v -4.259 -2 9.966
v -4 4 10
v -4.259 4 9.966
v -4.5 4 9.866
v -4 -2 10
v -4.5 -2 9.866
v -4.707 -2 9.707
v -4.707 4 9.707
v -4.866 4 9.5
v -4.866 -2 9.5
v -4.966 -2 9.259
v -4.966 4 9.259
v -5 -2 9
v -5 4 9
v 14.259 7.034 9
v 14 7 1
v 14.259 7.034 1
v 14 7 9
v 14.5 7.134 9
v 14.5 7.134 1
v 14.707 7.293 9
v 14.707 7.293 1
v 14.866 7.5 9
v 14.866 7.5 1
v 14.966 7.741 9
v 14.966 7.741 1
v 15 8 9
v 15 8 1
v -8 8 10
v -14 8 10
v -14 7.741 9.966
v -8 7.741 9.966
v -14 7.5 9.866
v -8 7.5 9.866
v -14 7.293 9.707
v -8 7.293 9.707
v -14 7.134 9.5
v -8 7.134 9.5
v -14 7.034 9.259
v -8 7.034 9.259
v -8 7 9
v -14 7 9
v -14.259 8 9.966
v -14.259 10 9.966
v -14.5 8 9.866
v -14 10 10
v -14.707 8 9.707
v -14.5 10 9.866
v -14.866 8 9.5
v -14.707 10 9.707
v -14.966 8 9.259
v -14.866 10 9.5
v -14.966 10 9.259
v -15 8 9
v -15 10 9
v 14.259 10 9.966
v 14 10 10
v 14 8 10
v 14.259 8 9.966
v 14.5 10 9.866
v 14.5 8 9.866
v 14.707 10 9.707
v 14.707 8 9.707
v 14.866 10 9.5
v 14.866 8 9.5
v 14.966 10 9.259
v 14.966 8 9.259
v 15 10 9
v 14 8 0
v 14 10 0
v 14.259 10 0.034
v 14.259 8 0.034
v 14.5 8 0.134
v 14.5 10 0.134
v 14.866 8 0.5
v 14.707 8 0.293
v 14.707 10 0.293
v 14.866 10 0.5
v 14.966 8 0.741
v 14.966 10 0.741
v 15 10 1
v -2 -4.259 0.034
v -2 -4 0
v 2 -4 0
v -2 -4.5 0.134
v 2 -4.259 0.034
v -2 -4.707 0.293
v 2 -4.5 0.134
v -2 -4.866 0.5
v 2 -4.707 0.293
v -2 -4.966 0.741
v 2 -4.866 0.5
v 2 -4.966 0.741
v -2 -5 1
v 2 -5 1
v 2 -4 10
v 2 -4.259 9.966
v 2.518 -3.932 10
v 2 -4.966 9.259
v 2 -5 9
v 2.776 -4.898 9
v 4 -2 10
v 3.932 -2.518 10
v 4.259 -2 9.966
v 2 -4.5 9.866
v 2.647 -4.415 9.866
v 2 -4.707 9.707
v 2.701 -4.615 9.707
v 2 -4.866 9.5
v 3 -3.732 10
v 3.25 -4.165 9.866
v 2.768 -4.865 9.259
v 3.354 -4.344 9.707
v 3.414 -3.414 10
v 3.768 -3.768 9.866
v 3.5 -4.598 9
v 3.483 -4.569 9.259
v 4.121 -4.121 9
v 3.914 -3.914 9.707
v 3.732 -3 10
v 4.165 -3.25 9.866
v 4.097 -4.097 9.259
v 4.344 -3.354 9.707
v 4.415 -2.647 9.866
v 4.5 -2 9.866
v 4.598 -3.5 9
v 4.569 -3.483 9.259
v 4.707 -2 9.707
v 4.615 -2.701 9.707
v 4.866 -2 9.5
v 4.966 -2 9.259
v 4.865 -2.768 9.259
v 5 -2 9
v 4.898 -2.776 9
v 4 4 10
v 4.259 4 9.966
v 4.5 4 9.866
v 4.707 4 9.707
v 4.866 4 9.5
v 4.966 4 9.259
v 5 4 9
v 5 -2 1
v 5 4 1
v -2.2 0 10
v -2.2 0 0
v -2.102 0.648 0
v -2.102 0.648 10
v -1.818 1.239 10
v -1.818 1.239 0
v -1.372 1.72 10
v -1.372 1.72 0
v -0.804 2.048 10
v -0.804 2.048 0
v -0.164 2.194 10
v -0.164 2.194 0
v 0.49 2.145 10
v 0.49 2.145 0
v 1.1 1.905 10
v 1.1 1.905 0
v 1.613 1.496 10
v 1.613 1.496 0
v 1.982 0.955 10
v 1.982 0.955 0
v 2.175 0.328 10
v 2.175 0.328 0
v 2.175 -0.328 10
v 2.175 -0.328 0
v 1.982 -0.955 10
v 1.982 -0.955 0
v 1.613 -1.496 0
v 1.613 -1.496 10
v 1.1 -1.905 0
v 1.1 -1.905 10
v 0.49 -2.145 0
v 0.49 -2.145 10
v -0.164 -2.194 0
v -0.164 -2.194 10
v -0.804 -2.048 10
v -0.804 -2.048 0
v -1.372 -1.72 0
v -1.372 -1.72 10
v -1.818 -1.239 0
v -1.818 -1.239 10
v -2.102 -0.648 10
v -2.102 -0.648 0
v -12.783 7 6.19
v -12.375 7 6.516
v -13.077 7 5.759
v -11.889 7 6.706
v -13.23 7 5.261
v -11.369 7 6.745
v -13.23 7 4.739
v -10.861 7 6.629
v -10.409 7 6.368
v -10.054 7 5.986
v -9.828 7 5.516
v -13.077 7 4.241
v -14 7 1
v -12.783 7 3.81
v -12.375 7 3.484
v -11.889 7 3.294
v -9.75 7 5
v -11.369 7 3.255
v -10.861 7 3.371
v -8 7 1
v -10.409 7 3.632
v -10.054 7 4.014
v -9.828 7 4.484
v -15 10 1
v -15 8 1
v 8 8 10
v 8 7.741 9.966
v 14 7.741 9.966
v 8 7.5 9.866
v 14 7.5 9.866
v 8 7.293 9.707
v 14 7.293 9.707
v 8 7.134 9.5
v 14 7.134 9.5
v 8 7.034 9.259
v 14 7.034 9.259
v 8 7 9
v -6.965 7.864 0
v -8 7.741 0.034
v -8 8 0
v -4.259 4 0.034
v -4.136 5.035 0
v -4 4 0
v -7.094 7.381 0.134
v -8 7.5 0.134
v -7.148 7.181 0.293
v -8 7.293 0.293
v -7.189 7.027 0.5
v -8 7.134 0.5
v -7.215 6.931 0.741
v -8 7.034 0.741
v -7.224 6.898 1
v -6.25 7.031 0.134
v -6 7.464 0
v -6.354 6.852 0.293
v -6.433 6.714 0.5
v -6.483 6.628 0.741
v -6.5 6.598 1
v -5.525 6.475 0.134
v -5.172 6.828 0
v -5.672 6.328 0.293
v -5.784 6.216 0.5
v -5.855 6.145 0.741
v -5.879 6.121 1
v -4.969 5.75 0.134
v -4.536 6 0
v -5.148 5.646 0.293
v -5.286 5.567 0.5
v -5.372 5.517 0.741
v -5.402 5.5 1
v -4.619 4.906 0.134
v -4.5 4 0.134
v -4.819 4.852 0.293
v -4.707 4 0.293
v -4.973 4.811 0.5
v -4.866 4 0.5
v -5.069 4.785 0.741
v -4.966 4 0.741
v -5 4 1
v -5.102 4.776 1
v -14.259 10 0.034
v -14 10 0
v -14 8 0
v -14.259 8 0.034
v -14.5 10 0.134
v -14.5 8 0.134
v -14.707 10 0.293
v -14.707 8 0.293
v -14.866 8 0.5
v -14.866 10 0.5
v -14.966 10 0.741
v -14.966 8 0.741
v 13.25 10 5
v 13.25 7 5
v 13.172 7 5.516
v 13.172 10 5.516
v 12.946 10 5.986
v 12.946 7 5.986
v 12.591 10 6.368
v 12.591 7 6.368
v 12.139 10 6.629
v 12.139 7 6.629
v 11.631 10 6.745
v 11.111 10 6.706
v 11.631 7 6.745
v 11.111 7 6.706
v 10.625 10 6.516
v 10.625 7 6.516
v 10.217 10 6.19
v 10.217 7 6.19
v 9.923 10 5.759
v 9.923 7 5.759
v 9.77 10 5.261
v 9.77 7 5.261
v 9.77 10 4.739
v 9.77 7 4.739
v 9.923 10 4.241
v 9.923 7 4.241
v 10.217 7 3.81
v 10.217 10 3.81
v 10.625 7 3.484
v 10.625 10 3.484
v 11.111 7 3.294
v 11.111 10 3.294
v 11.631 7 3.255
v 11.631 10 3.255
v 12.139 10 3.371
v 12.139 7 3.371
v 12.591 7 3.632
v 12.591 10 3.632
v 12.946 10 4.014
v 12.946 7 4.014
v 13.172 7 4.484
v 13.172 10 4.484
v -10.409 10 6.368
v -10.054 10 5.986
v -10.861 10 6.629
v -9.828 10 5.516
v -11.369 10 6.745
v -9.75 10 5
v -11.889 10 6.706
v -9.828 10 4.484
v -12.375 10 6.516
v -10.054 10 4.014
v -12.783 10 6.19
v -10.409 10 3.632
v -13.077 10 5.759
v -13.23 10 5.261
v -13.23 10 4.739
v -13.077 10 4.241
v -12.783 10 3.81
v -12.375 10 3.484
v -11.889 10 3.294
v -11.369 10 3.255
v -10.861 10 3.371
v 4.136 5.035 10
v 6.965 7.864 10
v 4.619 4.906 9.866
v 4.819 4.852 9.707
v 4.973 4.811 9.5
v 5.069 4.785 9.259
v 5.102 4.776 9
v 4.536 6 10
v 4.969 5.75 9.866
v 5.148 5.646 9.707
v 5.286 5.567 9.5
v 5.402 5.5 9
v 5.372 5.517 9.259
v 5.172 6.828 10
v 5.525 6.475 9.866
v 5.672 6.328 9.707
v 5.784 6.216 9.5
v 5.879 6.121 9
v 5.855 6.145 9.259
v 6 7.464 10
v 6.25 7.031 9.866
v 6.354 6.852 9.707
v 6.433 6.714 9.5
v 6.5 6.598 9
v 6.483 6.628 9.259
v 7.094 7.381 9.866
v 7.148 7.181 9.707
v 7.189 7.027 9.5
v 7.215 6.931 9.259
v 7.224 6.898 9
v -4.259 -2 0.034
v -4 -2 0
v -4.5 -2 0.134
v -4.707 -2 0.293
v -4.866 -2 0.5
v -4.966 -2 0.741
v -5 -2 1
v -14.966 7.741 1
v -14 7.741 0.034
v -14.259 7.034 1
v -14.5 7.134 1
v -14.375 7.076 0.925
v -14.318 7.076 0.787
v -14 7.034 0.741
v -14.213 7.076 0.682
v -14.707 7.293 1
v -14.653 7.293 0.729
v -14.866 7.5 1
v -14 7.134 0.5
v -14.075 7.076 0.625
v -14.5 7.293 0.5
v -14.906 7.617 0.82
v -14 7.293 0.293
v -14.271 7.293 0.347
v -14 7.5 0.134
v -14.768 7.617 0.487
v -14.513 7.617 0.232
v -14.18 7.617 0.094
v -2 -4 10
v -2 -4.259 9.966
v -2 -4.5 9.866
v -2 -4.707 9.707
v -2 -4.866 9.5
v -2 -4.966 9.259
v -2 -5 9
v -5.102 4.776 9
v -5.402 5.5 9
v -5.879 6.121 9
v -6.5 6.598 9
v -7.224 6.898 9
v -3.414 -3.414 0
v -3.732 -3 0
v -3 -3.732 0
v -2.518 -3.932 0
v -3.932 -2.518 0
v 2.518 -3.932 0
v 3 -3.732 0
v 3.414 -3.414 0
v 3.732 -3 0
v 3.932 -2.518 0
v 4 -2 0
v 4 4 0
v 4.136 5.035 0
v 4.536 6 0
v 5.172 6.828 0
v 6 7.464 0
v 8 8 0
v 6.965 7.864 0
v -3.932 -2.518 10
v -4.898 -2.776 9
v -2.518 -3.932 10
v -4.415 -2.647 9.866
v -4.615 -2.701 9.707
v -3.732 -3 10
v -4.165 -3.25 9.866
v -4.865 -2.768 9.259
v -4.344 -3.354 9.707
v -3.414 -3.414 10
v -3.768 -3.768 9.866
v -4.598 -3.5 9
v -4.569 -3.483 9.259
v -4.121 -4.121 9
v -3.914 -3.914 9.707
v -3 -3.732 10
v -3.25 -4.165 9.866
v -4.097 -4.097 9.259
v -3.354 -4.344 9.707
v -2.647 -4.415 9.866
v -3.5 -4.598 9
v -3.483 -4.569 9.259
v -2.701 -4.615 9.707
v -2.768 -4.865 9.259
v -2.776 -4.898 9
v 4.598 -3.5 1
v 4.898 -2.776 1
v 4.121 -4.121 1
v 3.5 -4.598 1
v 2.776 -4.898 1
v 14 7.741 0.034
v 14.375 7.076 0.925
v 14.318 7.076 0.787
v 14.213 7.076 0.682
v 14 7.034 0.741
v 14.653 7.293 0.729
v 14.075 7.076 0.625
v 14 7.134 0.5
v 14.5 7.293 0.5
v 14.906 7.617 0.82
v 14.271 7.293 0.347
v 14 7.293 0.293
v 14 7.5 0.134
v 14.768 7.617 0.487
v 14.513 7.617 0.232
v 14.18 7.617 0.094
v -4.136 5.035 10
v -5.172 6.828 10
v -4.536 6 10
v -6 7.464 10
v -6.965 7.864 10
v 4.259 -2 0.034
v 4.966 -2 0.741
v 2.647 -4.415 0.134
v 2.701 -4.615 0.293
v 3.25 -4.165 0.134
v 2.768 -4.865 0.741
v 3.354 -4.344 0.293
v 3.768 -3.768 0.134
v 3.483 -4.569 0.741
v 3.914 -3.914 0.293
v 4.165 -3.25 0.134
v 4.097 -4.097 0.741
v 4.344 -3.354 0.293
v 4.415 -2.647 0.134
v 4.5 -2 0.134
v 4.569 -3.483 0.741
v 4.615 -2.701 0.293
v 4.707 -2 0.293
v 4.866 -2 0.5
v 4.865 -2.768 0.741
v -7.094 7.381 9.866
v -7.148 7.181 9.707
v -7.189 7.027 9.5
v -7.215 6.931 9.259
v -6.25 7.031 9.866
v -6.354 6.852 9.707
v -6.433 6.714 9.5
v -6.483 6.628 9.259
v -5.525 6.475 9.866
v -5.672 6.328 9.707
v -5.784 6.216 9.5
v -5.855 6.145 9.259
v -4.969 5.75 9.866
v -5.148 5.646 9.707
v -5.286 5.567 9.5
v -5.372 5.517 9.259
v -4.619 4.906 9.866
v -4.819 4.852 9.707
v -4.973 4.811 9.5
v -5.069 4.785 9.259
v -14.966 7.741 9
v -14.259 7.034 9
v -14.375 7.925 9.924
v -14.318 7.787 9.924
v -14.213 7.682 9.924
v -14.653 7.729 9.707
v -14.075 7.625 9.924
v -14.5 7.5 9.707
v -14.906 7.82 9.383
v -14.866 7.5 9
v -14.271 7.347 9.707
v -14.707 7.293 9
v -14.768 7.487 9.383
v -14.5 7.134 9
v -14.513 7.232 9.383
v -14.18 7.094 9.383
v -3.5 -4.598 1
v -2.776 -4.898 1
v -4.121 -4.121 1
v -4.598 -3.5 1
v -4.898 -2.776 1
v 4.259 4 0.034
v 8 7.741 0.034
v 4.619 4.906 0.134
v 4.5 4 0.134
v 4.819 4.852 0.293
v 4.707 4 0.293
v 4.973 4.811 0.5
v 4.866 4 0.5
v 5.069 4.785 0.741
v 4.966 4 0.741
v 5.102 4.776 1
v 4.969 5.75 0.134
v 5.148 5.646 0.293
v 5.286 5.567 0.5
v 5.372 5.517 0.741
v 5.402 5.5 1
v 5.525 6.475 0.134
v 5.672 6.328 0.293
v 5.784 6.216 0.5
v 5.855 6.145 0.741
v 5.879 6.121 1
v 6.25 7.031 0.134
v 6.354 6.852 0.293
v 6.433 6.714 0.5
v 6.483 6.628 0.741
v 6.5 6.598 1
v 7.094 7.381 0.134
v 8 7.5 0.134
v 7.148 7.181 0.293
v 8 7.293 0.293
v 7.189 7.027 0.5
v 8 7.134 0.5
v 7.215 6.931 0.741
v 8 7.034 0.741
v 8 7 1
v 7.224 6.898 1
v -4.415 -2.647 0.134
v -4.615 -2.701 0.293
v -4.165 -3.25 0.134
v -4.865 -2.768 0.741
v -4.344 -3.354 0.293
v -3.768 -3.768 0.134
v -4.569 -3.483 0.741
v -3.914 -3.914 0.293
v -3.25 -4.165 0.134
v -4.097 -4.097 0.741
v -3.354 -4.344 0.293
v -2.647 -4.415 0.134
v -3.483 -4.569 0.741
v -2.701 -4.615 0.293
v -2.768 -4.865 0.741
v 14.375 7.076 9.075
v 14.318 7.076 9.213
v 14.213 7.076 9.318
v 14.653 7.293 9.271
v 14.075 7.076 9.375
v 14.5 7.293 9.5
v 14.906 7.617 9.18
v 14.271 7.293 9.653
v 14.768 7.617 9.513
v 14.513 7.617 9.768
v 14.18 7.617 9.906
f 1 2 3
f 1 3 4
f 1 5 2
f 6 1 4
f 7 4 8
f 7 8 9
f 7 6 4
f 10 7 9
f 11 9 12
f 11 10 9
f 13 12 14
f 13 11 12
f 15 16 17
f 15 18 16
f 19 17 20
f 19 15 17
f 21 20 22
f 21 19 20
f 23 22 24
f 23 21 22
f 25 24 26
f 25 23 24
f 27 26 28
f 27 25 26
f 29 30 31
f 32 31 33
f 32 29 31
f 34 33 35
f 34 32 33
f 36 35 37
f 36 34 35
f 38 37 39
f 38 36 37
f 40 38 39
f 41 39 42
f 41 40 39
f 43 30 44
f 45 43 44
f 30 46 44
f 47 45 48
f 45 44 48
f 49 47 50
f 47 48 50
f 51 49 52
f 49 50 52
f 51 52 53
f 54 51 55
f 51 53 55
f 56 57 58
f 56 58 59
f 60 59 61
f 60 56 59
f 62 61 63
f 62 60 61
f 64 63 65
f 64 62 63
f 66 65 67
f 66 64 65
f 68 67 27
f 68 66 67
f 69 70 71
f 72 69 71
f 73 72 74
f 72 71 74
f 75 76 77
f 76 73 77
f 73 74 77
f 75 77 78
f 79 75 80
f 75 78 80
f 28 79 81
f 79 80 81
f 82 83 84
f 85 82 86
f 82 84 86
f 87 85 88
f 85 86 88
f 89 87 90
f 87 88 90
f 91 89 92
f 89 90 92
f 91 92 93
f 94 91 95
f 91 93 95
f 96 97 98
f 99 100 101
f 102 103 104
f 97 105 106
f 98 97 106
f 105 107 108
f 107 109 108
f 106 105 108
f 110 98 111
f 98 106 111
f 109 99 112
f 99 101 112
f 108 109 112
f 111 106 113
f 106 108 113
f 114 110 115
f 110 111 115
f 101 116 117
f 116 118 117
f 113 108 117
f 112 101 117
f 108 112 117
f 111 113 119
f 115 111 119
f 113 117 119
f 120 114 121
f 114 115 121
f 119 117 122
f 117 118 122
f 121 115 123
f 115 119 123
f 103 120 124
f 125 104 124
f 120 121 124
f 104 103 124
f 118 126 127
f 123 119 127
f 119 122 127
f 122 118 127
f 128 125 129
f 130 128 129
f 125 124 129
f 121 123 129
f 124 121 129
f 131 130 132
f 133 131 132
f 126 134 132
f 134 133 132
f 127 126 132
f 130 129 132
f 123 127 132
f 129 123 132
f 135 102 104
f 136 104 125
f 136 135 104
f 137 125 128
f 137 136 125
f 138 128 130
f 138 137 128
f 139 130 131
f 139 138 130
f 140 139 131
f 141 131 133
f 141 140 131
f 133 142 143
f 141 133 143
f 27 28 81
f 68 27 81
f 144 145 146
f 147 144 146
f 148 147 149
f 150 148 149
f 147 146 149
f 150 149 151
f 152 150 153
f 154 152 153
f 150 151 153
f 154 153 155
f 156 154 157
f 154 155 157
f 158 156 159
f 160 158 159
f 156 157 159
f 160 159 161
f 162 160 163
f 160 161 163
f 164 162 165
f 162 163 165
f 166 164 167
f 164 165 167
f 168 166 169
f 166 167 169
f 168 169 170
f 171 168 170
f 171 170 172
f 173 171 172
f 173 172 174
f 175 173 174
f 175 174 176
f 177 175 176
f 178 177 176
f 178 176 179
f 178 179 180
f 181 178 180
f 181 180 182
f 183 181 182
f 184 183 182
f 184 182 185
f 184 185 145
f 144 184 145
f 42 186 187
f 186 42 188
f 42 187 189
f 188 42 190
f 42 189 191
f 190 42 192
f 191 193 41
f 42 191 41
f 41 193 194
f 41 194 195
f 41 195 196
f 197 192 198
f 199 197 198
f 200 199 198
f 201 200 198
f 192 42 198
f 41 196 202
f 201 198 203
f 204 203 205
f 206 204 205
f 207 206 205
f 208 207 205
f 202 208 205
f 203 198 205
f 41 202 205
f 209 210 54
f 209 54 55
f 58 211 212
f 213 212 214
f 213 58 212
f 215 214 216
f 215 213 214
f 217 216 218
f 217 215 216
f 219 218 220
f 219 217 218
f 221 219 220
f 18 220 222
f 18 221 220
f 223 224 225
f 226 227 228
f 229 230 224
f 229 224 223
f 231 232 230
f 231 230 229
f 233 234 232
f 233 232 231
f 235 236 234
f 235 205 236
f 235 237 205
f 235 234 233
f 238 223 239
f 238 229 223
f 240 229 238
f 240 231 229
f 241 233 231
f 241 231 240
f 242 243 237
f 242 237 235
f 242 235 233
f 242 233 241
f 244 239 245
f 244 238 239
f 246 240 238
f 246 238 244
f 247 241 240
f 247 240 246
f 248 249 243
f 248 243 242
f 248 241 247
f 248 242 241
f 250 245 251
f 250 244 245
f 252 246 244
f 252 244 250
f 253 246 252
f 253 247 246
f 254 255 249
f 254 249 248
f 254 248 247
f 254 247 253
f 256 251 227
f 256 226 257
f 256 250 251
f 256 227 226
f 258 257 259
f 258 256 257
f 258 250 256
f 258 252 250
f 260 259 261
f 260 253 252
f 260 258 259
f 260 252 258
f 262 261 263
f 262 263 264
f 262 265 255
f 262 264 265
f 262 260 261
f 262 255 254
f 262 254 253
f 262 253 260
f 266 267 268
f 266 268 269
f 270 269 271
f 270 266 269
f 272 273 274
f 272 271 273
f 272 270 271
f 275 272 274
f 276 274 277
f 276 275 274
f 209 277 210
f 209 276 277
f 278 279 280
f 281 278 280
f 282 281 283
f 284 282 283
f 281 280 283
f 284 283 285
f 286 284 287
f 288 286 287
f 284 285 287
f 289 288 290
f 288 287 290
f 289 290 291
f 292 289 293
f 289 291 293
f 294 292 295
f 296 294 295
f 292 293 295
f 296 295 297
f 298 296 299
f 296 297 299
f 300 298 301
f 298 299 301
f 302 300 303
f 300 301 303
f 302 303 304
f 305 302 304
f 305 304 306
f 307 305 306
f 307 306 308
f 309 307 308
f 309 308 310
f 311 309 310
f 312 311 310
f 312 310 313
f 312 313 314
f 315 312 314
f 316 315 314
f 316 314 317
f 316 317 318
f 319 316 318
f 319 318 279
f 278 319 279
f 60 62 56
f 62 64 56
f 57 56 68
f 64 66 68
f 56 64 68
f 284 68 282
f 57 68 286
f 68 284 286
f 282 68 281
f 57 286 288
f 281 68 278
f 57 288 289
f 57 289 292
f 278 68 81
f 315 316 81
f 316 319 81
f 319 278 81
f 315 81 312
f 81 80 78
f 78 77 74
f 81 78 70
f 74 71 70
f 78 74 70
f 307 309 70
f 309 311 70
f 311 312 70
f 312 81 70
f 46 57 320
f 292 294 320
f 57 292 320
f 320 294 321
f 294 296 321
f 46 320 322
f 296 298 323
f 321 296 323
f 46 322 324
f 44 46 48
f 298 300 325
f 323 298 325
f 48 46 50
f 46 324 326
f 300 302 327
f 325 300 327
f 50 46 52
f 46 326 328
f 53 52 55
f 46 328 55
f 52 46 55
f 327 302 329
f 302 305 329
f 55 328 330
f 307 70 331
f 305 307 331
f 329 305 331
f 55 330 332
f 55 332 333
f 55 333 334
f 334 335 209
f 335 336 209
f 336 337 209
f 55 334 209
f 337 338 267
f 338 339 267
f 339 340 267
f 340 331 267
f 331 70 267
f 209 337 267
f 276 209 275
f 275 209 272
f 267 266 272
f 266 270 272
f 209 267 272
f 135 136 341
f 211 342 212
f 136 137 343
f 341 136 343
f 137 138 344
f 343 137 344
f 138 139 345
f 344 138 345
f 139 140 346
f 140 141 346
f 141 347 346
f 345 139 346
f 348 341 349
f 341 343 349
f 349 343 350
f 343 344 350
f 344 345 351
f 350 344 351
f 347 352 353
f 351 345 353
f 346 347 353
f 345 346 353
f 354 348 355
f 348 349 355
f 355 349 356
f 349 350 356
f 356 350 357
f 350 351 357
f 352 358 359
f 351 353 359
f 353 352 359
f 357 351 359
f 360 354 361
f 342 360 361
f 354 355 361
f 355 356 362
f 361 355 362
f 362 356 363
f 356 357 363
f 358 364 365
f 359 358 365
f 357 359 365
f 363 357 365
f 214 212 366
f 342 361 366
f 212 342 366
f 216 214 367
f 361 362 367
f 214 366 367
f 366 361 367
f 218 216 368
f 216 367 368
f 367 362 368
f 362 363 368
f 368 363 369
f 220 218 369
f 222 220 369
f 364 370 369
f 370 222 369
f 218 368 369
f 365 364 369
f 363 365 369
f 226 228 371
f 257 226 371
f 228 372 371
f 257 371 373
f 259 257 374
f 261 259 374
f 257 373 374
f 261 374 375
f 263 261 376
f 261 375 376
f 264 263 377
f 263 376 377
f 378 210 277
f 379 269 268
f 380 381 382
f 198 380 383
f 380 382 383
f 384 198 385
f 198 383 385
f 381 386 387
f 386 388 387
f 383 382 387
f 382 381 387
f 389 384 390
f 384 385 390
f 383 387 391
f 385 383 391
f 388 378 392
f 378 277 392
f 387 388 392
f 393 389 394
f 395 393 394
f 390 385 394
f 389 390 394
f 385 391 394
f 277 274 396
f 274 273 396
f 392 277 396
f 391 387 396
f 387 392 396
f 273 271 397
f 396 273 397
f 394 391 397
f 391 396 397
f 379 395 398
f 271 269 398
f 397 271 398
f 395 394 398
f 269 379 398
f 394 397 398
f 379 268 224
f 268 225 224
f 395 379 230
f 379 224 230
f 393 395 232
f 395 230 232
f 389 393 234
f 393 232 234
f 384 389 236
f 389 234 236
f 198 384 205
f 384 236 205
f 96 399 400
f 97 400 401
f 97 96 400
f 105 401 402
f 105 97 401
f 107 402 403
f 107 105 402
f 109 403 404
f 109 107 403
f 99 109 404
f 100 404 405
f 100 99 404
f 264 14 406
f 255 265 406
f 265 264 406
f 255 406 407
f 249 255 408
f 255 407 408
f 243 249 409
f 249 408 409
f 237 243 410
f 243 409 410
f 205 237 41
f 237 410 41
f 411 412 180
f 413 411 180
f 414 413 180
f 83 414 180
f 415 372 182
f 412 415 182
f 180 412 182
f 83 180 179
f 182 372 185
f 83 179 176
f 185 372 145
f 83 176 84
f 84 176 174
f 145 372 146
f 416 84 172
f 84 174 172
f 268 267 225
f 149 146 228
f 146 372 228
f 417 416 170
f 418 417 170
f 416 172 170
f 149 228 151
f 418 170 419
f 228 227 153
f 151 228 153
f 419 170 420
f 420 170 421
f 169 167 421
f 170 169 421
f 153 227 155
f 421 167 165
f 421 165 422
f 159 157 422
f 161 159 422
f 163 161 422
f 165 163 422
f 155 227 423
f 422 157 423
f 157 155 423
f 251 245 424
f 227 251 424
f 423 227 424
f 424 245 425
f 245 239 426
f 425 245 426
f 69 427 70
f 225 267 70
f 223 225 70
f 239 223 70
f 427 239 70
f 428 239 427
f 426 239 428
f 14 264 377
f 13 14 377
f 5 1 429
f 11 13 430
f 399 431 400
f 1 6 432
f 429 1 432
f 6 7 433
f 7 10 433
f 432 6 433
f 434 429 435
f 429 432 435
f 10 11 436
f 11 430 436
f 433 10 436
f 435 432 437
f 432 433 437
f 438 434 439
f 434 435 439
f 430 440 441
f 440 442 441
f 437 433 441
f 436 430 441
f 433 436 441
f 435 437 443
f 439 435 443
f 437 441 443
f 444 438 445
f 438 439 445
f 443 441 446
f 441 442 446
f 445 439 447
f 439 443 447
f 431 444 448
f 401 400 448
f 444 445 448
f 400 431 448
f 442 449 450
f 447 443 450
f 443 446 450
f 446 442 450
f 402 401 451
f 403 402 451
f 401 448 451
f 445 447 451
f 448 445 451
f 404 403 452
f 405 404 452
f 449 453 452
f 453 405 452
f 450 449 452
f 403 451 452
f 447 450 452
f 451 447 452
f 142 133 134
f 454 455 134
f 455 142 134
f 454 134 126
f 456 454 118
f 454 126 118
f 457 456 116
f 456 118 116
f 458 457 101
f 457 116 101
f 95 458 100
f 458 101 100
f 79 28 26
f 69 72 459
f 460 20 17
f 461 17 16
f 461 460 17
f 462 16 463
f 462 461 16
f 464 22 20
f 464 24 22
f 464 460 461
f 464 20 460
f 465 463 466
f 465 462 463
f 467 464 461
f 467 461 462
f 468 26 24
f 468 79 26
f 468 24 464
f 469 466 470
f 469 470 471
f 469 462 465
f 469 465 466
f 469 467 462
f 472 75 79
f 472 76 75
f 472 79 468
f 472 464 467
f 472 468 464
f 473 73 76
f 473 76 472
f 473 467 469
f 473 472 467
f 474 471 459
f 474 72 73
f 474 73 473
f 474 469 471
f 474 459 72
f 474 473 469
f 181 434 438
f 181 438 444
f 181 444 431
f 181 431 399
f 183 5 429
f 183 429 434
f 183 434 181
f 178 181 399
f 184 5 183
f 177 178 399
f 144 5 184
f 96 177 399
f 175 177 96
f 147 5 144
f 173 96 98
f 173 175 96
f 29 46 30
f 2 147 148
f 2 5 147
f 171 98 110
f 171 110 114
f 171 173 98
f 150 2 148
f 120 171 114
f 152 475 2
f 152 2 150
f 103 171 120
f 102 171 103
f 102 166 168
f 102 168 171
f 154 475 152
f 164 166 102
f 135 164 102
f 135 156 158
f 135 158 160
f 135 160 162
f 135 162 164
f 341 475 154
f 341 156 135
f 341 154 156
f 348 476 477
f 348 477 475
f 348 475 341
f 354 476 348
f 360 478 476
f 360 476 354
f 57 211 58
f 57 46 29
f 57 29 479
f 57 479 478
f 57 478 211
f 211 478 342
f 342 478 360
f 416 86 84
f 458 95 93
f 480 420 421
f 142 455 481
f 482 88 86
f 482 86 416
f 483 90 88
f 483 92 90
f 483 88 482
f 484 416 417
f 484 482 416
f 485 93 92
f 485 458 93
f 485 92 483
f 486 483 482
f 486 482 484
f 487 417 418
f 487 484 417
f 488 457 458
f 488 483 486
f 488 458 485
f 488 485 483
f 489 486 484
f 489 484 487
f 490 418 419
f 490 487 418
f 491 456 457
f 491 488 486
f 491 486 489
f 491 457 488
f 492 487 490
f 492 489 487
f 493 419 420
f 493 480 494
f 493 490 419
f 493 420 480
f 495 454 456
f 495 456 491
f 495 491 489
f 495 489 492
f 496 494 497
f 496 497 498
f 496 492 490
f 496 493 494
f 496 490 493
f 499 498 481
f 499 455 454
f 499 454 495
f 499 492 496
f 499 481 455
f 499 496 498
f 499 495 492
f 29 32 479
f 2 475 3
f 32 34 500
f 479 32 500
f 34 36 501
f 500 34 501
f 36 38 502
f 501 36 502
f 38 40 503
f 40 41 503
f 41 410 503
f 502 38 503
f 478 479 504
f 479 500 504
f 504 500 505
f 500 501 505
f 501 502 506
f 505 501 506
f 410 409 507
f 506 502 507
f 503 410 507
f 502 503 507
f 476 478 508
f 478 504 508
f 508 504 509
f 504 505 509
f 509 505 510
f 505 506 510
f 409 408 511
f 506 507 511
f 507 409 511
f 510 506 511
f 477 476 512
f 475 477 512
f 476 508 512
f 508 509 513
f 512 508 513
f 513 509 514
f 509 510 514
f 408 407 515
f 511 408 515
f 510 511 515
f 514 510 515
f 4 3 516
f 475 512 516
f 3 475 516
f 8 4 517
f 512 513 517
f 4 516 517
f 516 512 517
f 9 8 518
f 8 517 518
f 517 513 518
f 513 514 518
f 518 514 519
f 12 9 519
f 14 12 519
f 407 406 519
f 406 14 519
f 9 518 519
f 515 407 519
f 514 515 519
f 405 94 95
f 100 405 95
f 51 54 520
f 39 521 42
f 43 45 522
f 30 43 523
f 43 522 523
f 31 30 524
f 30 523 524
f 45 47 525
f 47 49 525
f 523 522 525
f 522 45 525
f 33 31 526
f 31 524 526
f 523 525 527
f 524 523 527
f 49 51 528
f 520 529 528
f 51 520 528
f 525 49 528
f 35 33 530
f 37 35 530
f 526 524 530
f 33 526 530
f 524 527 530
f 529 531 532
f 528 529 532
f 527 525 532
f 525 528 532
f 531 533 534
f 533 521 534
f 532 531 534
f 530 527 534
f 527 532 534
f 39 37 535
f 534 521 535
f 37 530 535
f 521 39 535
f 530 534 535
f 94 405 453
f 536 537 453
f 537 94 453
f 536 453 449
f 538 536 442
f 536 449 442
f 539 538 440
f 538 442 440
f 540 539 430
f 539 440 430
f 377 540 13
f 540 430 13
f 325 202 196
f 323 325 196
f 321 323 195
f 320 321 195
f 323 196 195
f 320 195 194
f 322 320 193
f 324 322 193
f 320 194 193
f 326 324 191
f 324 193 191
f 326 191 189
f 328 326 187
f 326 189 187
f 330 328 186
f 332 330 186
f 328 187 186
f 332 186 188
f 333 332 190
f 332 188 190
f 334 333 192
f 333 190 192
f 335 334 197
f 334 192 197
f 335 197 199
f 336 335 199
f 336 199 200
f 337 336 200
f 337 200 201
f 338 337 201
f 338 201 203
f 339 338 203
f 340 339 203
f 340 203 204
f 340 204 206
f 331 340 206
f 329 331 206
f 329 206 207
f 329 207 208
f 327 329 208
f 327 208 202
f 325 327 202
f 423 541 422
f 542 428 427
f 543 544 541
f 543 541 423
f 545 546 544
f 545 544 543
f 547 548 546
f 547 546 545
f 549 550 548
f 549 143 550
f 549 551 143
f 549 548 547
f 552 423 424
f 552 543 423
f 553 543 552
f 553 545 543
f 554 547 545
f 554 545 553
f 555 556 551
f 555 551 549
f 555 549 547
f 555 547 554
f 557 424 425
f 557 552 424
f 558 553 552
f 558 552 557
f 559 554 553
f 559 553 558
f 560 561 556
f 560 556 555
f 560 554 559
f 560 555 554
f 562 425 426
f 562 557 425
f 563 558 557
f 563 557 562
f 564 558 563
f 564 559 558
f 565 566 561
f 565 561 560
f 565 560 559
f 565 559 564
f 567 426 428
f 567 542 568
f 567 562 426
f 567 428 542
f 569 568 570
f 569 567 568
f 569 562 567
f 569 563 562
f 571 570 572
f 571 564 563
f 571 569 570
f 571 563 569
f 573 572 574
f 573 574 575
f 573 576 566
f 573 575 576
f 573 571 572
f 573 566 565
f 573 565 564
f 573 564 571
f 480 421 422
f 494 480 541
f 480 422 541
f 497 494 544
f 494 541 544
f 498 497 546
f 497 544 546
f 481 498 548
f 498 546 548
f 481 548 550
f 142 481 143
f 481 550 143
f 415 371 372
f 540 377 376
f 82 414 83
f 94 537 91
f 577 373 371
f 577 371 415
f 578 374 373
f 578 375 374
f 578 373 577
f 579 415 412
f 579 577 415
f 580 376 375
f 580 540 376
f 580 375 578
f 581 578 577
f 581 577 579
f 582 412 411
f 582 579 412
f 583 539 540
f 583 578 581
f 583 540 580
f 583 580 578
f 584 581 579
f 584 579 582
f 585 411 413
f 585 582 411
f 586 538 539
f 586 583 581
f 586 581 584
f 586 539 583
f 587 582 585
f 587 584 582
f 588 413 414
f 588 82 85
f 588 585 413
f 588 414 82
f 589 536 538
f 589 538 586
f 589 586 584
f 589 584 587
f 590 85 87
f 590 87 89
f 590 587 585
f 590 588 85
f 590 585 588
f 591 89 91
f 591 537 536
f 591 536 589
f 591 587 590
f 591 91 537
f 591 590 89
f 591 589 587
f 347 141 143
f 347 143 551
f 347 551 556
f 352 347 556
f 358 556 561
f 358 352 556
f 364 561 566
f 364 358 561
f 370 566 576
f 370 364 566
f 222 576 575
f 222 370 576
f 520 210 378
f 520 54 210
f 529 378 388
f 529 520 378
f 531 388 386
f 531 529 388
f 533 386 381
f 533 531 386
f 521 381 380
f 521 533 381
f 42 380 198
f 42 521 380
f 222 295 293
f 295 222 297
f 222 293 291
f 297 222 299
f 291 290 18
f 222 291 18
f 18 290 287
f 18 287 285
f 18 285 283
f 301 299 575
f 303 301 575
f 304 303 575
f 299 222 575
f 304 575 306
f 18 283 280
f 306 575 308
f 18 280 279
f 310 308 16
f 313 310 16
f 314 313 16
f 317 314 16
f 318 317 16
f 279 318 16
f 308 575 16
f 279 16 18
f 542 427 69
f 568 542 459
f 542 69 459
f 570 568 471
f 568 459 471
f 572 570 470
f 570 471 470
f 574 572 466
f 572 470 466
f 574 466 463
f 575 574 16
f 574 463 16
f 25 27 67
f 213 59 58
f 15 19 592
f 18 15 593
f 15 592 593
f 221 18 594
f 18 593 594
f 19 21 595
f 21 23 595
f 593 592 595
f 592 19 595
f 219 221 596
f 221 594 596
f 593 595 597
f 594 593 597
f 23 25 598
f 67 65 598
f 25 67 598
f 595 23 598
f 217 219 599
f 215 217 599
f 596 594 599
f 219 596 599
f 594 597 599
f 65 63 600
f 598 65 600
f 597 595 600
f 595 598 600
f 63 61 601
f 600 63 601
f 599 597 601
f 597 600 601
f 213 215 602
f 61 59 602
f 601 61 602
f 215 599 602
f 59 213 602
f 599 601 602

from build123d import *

# Parameters (mm, degrees)
SKETCH_1_W          = 10
SKETCH_1_H          = 3
EXTRUDE_1_DEPTH     = 10
SKETCH_2_R          = 2.2
CUT_EXTRUDE_1_DEPTH = 11
SKETCH_3_R          = 1.75
CUT_EXTRUDE_2_DEPTH = 4
FILLET_1_R          = 3
FILLET_2_R          = 1


with BuildPart() as part:
    # ｽｹｯﾁ1 → ﾎﾞｽ - 押し出し1 (new body)
    with BuildSketch(Plane.XY):
        Polygon((5, 10), (0, 10), (0, -5), (5, -5), (5, 7), align=None)
        with Locations((10, 8.5)):
            Rectangle(SKETCH_1_W, SKETCH_1_H)
        Polygon((0, -5), (0, 10), (-5, 10), (-5, 7), (-5, -5), align=None)
        with Locations((-10, 8.5)):
            Rectangle(SKETCH_1_W, SKETCH_1_H)
    extrude(amount=EXTRUDE_1_DEPTH)

    # ｽｹｯﾁ2 → ｶｯﾄ - 押し出し1 (cut, through all)
    with BuildSketch(Plane(origin=(0, 0, 0), x_dir=(-1, 0, 0), z_dir=(0, 0, -1))):
        Circle(SKETCH_2_R)
    extrude(amount=-CUT_EXTRUDE_1_DEPTH, mode=Mode.SUBTRACT)

    # ｽｹｯﾁ3 → ｶｯﾄ - 押し出し2 (cut, through all)
    with BuildSketch(Plane.XZ.offset(-7)):
        with Locations((-11.5, 5)):
            Circle(SKETCH_3_R)
        with Locations((11.5, 5)):
            Circle(SKETCH_3_R)
    extrude(amount=-CUT_EXTRUDE_2_DEPTH, mode=Mode.SUBTRACT)

    # ﾌｨﾚｯﾄ1
    fillet_1_edges = [part.edges().sort_by_distance(p)[0] for p in [
        (5, -5, 5),
        (-5, -5, 5),
        (-5, 7, 5),
        (5, 7, 5),
    ]]
    fillet(fillet_1_edges, radius=FILLET_1_R)

    # ﾌｨﾚｯﾄ2
    fillet_2_edges = [part.edges().sort_by_distance(p)[0] for p in [
        (-15, 8.5, 0),
        (15, 8.5, 0),
        (15, 8.5, 10),
        (-15, 7, 5),
        (15, 7, 5),
        (-15, 8.5, 10),
        (-5, 1, 0),
        (-5, 1, 10),
        (-11.5, 7, 0),
        (-11.5, 7, 10),
        (11.5, 7, 0),
        (11.5, 7, 10),
        (5, 1, 0),
        (5, 1, 10),
        (0, -5, 0),
        (0, -5, 10),
        (4.121320344, -4.121320344, 0),
        (-4.121320344, -4.121320344, 0),
        (4.121320344, -4.121320344, 10),
        (-4.121320344, -4.121320344, 10),
        (-5.878679656, 6.121320344, 0),
        (-5.878679656, 6.121320344, 10),
        (5.878679656, 6.121320344, 0),
        (5.878679656, 6.121320344, 10),
    ]]
    fillet(fillet_2_edges, radius=FILLET_2_R)


solid = part.part
